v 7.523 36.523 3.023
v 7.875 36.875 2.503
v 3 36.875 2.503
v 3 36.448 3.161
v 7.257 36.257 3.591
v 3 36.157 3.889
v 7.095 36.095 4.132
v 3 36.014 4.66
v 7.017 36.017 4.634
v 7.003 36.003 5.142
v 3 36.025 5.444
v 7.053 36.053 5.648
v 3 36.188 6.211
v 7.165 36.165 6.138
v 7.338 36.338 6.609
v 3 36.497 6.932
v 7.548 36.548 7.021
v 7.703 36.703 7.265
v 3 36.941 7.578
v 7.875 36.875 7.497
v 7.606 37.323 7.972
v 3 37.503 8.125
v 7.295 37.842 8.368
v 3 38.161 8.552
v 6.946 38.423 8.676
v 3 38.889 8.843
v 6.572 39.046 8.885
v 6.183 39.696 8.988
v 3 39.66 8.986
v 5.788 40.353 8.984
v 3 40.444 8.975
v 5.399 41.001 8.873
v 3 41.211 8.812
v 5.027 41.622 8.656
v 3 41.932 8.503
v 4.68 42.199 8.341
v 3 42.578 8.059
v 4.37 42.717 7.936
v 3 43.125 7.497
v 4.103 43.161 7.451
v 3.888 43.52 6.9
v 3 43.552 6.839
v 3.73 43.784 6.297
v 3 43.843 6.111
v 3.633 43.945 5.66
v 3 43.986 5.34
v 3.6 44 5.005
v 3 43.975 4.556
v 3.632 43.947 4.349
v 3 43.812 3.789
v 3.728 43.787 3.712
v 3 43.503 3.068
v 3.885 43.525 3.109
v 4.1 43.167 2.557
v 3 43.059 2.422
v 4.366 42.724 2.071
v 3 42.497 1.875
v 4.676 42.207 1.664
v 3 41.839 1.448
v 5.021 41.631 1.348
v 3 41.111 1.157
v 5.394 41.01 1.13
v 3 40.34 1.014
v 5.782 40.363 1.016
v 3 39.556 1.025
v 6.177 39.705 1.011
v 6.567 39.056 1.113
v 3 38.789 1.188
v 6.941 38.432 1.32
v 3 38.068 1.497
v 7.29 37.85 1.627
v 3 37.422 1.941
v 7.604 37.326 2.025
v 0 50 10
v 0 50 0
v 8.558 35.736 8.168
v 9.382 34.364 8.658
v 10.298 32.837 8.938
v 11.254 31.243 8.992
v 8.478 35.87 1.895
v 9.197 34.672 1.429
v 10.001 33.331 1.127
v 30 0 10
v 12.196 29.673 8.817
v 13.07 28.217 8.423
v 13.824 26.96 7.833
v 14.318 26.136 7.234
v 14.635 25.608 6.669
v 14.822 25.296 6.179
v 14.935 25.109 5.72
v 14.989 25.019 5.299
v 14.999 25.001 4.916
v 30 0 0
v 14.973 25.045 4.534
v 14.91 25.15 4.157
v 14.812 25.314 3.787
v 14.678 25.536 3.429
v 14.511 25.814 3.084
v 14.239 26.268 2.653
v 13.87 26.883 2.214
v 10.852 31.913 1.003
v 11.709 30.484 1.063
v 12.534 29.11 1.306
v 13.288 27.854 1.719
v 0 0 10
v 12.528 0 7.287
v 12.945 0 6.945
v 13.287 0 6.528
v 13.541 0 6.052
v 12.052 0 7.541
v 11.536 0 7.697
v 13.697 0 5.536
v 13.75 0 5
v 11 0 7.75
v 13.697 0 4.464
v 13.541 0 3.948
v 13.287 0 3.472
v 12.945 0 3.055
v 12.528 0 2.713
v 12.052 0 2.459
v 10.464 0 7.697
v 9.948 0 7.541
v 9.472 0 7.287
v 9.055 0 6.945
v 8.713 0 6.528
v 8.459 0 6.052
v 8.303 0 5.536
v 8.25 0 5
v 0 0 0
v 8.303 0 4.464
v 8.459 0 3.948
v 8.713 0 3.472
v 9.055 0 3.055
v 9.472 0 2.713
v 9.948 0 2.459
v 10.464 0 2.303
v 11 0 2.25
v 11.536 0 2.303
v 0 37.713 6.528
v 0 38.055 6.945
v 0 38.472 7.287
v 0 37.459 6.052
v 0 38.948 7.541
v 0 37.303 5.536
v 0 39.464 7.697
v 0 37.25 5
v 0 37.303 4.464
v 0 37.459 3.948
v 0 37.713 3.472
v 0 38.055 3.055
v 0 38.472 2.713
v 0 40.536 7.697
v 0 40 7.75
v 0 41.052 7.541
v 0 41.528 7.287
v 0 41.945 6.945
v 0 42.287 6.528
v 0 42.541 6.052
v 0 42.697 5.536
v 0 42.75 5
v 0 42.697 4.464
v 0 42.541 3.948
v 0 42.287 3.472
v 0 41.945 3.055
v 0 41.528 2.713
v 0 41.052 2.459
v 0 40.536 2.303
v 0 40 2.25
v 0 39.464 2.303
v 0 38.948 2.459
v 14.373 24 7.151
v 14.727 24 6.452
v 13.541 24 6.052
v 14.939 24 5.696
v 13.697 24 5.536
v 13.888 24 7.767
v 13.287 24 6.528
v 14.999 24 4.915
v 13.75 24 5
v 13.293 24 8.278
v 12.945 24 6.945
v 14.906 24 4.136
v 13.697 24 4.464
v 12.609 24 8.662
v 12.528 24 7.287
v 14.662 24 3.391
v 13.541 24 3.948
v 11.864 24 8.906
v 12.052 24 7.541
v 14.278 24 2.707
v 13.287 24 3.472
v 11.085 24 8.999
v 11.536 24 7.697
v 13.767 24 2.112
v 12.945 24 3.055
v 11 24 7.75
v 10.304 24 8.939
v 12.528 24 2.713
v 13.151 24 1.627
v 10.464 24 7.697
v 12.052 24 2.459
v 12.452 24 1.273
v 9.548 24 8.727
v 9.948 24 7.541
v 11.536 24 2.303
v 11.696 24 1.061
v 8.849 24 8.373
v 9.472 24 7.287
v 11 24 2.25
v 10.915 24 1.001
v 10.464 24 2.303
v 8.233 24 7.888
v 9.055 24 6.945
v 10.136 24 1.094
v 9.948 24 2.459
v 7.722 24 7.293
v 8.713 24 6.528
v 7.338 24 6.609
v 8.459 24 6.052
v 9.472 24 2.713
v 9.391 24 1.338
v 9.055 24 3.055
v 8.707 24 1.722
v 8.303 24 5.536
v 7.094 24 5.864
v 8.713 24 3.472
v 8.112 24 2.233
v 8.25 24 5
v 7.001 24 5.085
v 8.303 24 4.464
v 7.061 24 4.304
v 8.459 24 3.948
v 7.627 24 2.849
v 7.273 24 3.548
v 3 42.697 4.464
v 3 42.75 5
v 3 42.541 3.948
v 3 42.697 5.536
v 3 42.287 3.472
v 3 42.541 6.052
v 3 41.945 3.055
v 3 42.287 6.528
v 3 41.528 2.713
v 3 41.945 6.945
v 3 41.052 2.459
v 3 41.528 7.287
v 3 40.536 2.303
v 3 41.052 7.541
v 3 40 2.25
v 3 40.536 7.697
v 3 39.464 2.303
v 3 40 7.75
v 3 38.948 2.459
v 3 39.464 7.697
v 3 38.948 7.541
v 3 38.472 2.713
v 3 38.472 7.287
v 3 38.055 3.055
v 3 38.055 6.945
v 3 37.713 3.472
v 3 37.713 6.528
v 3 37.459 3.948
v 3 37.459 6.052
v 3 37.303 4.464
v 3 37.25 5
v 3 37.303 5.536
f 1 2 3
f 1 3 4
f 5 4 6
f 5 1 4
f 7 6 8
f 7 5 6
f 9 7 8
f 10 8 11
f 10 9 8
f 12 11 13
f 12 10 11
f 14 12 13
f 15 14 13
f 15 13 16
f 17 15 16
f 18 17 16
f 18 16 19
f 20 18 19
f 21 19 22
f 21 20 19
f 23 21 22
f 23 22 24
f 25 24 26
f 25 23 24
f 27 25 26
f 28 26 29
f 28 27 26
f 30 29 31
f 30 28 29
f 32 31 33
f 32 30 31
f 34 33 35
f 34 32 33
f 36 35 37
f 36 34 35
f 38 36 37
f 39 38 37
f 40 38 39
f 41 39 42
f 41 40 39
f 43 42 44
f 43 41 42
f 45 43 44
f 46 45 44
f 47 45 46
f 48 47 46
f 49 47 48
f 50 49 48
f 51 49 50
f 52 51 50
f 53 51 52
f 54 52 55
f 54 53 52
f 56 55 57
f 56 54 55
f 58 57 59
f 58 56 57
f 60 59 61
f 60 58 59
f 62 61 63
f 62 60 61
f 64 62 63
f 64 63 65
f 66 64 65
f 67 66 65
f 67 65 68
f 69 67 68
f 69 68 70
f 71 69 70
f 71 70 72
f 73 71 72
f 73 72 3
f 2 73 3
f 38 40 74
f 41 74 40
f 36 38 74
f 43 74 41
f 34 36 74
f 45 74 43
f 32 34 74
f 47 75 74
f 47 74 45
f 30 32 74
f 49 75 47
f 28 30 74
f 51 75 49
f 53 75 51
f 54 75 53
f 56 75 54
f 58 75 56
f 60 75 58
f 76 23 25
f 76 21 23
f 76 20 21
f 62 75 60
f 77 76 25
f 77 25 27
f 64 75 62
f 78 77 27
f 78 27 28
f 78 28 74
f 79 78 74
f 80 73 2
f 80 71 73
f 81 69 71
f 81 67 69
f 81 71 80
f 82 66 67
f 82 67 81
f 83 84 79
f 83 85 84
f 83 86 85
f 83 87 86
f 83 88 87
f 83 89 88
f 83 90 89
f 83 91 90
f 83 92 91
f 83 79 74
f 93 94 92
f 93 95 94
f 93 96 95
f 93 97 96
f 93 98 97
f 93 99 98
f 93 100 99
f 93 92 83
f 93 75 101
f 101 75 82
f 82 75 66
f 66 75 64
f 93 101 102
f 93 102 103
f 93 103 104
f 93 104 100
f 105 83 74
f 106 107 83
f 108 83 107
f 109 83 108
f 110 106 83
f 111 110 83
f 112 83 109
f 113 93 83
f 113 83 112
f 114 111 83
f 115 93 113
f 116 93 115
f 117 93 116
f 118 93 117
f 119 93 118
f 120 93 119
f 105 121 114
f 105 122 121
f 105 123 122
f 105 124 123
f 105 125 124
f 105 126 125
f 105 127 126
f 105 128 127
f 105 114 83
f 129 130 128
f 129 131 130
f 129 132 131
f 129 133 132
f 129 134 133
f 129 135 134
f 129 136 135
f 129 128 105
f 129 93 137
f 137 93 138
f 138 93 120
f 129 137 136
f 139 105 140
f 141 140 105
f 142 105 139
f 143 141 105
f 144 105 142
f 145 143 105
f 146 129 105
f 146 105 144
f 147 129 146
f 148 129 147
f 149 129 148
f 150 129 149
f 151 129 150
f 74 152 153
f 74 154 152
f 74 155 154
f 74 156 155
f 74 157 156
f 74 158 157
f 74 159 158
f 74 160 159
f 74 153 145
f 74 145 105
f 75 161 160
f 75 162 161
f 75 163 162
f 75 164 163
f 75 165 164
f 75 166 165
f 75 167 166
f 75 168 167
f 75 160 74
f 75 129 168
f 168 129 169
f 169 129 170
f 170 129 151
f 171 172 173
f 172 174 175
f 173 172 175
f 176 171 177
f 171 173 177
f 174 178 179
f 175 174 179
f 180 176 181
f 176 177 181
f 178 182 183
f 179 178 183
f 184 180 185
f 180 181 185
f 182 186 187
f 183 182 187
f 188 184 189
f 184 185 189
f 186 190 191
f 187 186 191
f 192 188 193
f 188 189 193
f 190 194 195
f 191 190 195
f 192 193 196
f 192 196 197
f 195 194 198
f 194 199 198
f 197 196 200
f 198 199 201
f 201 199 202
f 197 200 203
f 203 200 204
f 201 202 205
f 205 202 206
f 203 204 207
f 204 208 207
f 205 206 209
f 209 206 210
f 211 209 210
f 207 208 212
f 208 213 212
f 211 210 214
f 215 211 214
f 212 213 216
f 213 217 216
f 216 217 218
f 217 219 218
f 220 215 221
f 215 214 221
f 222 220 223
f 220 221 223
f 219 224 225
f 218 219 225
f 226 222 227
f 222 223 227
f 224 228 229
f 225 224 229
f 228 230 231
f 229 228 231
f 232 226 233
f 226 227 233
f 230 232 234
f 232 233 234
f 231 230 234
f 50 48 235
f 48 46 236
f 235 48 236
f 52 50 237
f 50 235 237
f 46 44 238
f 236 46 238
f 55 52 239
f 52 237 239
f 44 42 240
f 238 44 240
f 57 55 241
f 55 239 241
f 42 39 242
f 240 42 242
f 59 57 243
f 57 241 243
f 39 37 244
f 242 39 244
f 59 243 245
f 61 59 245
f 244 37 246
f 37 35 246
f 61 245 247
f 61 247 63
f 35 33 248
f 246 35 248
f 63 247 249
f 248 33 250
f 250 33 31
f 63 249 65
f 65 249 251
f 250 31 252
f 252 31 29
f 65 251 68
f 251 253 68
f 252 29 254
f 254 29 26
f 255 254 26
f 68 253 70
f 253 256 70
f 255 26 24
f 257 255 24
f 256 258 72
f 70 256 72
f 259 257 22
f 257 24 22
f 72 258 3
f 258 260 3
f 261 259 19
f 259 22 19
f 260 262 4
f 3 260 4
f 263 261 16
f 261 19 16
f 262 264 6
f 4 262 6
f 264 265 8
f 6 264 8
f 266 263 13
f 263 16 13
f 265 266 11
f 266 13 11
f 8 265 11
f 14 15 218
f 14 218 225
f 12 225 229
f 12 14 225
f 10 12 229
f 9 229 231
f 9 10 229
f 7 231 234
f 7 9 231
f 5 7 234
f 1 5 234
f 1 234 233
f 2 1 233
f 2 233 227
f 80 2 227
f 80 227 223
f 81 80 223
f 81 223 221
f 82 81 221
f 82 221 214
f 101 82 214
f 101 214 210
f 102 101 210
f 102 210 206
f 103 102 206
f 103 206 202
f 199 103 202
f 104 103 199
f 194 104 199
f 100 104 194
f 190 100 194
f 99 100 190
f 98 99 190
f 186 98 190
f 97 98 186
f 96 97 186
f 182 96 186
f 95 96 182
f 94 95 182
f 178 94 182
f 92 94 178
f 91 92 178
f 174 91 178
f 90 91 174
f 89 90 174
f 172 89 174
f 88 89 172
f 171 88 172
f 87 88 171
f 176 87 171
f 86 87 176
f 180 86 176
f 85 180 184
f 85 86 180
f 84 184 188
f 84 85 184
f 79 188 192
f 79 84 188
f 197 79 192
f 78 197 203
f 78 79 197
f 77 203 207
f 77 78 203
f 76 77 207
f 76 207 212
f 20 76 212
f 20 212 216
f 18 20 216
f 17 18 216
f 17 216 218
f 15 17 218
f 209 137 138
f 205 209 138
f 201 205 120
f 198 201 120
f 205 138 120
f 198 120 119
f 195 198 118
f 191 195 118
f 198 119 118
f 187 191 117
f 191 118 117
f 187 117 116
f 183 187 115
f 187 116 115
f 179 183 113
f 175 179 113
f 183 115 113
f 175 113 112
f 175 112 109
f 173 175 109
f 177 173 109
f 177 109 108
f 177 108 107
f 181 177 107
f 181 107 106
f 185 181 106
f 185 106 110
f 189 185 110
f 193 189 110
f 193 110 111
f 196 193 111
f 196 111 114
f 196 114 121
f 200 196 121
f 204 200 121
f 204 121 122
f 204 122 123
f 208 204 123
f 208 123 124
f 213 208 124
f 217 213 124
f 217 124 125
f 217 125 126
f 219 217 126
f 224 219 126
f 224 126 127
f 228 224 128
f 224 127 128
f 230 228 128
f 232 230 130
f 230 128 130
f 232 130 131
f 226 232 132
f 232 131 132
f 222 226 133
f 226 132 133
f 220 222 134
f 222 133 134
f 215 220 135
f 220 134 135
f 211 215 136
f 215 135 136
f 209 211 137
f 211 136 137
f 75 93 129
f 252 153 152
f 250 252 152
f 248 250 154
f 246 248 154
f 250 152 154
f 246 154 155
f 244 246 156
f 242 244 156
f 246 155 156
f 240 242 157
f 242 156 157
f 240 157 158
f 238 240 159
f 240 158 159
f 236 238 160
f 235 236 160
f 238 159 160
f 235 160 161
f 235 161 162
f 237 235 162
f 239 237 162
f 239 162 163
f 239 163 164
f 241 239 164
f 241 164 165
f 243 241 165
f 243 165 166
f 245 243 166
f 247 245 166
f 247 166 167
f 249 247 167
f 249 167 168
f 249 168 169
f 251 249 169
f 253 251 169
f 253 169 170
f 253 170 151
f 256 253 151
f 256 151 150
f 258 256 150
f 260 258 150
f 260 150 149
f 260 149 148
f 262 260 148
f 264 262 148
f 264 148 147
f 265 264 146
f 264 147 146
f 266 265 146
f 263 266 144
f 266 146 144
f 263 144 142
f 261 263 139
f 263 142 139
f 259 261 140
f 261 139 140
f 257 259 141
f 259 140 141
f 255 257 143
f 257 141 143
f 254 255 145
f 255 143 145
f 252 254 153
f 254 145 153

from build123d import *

# Parameters (mm, degrees)
EXTRUDE_1_DEPTH     = 10
SKETCH_2_R          = 2.75
CUT_EXTRUDE_1_DEPTH = 60.160797831
SKETCH_3_R          = 2.75
CUT_EXTRUDE_2_DEPTH = 60.160797831
SKETCH_4_R          = 4
CUT_EXTRUDE_3_DEPTH = 26
SKETCH_5_R          = 4
CUT_EXTRUDE_4_DEPTH = 27


with BuildPart() as part:
    # 草图1 → 凸台-拉伸1 (new body)
    with BuildSketch(Plane.XY):
        Polygon((0, 0), (0, 50), (30, 0), align=None)
    extrude(amount=EXTRUDE_1_DEPTH)

    # 草图2 → 切除-拉伸1 (cut, through all)
    with BuildSketch(Plane.XZ):
        with Locations(Location((11, 5, 0), (0, 0, 270))):
            Circle(SKETCH_2_R)
    extrude(amount=-CUT_EXTRUDE_1_DEPTH, mode=Mode.SUBTRACT)

    # 草图3 → 切除-拉伸2 (cut, through all)
    with BuildSketch(Plane.ZY):
        with Locations((5, 40)):
            Circle(SKETCH_3_R)
    extrude(amount=-CUT_EXTRUDE_2_DEPTH, mode=Mode.SUBTRACT)

    # 草图4 → 切除-拉伸3 (cut)
    with BuildSketch(Plane(origin=(0, 50, 0), x_dir=(-1, 0, 0), z_dir=(0, -1, 0))):
        with Locations(Location((-11, -5, 0), (0, 0, 336.277210116))):
            Circle(SKETCH_4_R)
    extrude(amount=CUT_EXTRUDE_3_DEPTH, mode=Mode.SUBTRACT)

    # 草图5 → 切除-拉伸4 (cut)
    with BuildSketch(Plane.ZY.offset(-30)):
        with Locations(Location((5, 40, 0), (0, 0, 231.375167127))):
            Circle(SKETCH_5_R)
    extrude(amount=CUT_EXTRUDE_4_DEPTH, mode=Mode.SUBTRACT)


solid = part.part
